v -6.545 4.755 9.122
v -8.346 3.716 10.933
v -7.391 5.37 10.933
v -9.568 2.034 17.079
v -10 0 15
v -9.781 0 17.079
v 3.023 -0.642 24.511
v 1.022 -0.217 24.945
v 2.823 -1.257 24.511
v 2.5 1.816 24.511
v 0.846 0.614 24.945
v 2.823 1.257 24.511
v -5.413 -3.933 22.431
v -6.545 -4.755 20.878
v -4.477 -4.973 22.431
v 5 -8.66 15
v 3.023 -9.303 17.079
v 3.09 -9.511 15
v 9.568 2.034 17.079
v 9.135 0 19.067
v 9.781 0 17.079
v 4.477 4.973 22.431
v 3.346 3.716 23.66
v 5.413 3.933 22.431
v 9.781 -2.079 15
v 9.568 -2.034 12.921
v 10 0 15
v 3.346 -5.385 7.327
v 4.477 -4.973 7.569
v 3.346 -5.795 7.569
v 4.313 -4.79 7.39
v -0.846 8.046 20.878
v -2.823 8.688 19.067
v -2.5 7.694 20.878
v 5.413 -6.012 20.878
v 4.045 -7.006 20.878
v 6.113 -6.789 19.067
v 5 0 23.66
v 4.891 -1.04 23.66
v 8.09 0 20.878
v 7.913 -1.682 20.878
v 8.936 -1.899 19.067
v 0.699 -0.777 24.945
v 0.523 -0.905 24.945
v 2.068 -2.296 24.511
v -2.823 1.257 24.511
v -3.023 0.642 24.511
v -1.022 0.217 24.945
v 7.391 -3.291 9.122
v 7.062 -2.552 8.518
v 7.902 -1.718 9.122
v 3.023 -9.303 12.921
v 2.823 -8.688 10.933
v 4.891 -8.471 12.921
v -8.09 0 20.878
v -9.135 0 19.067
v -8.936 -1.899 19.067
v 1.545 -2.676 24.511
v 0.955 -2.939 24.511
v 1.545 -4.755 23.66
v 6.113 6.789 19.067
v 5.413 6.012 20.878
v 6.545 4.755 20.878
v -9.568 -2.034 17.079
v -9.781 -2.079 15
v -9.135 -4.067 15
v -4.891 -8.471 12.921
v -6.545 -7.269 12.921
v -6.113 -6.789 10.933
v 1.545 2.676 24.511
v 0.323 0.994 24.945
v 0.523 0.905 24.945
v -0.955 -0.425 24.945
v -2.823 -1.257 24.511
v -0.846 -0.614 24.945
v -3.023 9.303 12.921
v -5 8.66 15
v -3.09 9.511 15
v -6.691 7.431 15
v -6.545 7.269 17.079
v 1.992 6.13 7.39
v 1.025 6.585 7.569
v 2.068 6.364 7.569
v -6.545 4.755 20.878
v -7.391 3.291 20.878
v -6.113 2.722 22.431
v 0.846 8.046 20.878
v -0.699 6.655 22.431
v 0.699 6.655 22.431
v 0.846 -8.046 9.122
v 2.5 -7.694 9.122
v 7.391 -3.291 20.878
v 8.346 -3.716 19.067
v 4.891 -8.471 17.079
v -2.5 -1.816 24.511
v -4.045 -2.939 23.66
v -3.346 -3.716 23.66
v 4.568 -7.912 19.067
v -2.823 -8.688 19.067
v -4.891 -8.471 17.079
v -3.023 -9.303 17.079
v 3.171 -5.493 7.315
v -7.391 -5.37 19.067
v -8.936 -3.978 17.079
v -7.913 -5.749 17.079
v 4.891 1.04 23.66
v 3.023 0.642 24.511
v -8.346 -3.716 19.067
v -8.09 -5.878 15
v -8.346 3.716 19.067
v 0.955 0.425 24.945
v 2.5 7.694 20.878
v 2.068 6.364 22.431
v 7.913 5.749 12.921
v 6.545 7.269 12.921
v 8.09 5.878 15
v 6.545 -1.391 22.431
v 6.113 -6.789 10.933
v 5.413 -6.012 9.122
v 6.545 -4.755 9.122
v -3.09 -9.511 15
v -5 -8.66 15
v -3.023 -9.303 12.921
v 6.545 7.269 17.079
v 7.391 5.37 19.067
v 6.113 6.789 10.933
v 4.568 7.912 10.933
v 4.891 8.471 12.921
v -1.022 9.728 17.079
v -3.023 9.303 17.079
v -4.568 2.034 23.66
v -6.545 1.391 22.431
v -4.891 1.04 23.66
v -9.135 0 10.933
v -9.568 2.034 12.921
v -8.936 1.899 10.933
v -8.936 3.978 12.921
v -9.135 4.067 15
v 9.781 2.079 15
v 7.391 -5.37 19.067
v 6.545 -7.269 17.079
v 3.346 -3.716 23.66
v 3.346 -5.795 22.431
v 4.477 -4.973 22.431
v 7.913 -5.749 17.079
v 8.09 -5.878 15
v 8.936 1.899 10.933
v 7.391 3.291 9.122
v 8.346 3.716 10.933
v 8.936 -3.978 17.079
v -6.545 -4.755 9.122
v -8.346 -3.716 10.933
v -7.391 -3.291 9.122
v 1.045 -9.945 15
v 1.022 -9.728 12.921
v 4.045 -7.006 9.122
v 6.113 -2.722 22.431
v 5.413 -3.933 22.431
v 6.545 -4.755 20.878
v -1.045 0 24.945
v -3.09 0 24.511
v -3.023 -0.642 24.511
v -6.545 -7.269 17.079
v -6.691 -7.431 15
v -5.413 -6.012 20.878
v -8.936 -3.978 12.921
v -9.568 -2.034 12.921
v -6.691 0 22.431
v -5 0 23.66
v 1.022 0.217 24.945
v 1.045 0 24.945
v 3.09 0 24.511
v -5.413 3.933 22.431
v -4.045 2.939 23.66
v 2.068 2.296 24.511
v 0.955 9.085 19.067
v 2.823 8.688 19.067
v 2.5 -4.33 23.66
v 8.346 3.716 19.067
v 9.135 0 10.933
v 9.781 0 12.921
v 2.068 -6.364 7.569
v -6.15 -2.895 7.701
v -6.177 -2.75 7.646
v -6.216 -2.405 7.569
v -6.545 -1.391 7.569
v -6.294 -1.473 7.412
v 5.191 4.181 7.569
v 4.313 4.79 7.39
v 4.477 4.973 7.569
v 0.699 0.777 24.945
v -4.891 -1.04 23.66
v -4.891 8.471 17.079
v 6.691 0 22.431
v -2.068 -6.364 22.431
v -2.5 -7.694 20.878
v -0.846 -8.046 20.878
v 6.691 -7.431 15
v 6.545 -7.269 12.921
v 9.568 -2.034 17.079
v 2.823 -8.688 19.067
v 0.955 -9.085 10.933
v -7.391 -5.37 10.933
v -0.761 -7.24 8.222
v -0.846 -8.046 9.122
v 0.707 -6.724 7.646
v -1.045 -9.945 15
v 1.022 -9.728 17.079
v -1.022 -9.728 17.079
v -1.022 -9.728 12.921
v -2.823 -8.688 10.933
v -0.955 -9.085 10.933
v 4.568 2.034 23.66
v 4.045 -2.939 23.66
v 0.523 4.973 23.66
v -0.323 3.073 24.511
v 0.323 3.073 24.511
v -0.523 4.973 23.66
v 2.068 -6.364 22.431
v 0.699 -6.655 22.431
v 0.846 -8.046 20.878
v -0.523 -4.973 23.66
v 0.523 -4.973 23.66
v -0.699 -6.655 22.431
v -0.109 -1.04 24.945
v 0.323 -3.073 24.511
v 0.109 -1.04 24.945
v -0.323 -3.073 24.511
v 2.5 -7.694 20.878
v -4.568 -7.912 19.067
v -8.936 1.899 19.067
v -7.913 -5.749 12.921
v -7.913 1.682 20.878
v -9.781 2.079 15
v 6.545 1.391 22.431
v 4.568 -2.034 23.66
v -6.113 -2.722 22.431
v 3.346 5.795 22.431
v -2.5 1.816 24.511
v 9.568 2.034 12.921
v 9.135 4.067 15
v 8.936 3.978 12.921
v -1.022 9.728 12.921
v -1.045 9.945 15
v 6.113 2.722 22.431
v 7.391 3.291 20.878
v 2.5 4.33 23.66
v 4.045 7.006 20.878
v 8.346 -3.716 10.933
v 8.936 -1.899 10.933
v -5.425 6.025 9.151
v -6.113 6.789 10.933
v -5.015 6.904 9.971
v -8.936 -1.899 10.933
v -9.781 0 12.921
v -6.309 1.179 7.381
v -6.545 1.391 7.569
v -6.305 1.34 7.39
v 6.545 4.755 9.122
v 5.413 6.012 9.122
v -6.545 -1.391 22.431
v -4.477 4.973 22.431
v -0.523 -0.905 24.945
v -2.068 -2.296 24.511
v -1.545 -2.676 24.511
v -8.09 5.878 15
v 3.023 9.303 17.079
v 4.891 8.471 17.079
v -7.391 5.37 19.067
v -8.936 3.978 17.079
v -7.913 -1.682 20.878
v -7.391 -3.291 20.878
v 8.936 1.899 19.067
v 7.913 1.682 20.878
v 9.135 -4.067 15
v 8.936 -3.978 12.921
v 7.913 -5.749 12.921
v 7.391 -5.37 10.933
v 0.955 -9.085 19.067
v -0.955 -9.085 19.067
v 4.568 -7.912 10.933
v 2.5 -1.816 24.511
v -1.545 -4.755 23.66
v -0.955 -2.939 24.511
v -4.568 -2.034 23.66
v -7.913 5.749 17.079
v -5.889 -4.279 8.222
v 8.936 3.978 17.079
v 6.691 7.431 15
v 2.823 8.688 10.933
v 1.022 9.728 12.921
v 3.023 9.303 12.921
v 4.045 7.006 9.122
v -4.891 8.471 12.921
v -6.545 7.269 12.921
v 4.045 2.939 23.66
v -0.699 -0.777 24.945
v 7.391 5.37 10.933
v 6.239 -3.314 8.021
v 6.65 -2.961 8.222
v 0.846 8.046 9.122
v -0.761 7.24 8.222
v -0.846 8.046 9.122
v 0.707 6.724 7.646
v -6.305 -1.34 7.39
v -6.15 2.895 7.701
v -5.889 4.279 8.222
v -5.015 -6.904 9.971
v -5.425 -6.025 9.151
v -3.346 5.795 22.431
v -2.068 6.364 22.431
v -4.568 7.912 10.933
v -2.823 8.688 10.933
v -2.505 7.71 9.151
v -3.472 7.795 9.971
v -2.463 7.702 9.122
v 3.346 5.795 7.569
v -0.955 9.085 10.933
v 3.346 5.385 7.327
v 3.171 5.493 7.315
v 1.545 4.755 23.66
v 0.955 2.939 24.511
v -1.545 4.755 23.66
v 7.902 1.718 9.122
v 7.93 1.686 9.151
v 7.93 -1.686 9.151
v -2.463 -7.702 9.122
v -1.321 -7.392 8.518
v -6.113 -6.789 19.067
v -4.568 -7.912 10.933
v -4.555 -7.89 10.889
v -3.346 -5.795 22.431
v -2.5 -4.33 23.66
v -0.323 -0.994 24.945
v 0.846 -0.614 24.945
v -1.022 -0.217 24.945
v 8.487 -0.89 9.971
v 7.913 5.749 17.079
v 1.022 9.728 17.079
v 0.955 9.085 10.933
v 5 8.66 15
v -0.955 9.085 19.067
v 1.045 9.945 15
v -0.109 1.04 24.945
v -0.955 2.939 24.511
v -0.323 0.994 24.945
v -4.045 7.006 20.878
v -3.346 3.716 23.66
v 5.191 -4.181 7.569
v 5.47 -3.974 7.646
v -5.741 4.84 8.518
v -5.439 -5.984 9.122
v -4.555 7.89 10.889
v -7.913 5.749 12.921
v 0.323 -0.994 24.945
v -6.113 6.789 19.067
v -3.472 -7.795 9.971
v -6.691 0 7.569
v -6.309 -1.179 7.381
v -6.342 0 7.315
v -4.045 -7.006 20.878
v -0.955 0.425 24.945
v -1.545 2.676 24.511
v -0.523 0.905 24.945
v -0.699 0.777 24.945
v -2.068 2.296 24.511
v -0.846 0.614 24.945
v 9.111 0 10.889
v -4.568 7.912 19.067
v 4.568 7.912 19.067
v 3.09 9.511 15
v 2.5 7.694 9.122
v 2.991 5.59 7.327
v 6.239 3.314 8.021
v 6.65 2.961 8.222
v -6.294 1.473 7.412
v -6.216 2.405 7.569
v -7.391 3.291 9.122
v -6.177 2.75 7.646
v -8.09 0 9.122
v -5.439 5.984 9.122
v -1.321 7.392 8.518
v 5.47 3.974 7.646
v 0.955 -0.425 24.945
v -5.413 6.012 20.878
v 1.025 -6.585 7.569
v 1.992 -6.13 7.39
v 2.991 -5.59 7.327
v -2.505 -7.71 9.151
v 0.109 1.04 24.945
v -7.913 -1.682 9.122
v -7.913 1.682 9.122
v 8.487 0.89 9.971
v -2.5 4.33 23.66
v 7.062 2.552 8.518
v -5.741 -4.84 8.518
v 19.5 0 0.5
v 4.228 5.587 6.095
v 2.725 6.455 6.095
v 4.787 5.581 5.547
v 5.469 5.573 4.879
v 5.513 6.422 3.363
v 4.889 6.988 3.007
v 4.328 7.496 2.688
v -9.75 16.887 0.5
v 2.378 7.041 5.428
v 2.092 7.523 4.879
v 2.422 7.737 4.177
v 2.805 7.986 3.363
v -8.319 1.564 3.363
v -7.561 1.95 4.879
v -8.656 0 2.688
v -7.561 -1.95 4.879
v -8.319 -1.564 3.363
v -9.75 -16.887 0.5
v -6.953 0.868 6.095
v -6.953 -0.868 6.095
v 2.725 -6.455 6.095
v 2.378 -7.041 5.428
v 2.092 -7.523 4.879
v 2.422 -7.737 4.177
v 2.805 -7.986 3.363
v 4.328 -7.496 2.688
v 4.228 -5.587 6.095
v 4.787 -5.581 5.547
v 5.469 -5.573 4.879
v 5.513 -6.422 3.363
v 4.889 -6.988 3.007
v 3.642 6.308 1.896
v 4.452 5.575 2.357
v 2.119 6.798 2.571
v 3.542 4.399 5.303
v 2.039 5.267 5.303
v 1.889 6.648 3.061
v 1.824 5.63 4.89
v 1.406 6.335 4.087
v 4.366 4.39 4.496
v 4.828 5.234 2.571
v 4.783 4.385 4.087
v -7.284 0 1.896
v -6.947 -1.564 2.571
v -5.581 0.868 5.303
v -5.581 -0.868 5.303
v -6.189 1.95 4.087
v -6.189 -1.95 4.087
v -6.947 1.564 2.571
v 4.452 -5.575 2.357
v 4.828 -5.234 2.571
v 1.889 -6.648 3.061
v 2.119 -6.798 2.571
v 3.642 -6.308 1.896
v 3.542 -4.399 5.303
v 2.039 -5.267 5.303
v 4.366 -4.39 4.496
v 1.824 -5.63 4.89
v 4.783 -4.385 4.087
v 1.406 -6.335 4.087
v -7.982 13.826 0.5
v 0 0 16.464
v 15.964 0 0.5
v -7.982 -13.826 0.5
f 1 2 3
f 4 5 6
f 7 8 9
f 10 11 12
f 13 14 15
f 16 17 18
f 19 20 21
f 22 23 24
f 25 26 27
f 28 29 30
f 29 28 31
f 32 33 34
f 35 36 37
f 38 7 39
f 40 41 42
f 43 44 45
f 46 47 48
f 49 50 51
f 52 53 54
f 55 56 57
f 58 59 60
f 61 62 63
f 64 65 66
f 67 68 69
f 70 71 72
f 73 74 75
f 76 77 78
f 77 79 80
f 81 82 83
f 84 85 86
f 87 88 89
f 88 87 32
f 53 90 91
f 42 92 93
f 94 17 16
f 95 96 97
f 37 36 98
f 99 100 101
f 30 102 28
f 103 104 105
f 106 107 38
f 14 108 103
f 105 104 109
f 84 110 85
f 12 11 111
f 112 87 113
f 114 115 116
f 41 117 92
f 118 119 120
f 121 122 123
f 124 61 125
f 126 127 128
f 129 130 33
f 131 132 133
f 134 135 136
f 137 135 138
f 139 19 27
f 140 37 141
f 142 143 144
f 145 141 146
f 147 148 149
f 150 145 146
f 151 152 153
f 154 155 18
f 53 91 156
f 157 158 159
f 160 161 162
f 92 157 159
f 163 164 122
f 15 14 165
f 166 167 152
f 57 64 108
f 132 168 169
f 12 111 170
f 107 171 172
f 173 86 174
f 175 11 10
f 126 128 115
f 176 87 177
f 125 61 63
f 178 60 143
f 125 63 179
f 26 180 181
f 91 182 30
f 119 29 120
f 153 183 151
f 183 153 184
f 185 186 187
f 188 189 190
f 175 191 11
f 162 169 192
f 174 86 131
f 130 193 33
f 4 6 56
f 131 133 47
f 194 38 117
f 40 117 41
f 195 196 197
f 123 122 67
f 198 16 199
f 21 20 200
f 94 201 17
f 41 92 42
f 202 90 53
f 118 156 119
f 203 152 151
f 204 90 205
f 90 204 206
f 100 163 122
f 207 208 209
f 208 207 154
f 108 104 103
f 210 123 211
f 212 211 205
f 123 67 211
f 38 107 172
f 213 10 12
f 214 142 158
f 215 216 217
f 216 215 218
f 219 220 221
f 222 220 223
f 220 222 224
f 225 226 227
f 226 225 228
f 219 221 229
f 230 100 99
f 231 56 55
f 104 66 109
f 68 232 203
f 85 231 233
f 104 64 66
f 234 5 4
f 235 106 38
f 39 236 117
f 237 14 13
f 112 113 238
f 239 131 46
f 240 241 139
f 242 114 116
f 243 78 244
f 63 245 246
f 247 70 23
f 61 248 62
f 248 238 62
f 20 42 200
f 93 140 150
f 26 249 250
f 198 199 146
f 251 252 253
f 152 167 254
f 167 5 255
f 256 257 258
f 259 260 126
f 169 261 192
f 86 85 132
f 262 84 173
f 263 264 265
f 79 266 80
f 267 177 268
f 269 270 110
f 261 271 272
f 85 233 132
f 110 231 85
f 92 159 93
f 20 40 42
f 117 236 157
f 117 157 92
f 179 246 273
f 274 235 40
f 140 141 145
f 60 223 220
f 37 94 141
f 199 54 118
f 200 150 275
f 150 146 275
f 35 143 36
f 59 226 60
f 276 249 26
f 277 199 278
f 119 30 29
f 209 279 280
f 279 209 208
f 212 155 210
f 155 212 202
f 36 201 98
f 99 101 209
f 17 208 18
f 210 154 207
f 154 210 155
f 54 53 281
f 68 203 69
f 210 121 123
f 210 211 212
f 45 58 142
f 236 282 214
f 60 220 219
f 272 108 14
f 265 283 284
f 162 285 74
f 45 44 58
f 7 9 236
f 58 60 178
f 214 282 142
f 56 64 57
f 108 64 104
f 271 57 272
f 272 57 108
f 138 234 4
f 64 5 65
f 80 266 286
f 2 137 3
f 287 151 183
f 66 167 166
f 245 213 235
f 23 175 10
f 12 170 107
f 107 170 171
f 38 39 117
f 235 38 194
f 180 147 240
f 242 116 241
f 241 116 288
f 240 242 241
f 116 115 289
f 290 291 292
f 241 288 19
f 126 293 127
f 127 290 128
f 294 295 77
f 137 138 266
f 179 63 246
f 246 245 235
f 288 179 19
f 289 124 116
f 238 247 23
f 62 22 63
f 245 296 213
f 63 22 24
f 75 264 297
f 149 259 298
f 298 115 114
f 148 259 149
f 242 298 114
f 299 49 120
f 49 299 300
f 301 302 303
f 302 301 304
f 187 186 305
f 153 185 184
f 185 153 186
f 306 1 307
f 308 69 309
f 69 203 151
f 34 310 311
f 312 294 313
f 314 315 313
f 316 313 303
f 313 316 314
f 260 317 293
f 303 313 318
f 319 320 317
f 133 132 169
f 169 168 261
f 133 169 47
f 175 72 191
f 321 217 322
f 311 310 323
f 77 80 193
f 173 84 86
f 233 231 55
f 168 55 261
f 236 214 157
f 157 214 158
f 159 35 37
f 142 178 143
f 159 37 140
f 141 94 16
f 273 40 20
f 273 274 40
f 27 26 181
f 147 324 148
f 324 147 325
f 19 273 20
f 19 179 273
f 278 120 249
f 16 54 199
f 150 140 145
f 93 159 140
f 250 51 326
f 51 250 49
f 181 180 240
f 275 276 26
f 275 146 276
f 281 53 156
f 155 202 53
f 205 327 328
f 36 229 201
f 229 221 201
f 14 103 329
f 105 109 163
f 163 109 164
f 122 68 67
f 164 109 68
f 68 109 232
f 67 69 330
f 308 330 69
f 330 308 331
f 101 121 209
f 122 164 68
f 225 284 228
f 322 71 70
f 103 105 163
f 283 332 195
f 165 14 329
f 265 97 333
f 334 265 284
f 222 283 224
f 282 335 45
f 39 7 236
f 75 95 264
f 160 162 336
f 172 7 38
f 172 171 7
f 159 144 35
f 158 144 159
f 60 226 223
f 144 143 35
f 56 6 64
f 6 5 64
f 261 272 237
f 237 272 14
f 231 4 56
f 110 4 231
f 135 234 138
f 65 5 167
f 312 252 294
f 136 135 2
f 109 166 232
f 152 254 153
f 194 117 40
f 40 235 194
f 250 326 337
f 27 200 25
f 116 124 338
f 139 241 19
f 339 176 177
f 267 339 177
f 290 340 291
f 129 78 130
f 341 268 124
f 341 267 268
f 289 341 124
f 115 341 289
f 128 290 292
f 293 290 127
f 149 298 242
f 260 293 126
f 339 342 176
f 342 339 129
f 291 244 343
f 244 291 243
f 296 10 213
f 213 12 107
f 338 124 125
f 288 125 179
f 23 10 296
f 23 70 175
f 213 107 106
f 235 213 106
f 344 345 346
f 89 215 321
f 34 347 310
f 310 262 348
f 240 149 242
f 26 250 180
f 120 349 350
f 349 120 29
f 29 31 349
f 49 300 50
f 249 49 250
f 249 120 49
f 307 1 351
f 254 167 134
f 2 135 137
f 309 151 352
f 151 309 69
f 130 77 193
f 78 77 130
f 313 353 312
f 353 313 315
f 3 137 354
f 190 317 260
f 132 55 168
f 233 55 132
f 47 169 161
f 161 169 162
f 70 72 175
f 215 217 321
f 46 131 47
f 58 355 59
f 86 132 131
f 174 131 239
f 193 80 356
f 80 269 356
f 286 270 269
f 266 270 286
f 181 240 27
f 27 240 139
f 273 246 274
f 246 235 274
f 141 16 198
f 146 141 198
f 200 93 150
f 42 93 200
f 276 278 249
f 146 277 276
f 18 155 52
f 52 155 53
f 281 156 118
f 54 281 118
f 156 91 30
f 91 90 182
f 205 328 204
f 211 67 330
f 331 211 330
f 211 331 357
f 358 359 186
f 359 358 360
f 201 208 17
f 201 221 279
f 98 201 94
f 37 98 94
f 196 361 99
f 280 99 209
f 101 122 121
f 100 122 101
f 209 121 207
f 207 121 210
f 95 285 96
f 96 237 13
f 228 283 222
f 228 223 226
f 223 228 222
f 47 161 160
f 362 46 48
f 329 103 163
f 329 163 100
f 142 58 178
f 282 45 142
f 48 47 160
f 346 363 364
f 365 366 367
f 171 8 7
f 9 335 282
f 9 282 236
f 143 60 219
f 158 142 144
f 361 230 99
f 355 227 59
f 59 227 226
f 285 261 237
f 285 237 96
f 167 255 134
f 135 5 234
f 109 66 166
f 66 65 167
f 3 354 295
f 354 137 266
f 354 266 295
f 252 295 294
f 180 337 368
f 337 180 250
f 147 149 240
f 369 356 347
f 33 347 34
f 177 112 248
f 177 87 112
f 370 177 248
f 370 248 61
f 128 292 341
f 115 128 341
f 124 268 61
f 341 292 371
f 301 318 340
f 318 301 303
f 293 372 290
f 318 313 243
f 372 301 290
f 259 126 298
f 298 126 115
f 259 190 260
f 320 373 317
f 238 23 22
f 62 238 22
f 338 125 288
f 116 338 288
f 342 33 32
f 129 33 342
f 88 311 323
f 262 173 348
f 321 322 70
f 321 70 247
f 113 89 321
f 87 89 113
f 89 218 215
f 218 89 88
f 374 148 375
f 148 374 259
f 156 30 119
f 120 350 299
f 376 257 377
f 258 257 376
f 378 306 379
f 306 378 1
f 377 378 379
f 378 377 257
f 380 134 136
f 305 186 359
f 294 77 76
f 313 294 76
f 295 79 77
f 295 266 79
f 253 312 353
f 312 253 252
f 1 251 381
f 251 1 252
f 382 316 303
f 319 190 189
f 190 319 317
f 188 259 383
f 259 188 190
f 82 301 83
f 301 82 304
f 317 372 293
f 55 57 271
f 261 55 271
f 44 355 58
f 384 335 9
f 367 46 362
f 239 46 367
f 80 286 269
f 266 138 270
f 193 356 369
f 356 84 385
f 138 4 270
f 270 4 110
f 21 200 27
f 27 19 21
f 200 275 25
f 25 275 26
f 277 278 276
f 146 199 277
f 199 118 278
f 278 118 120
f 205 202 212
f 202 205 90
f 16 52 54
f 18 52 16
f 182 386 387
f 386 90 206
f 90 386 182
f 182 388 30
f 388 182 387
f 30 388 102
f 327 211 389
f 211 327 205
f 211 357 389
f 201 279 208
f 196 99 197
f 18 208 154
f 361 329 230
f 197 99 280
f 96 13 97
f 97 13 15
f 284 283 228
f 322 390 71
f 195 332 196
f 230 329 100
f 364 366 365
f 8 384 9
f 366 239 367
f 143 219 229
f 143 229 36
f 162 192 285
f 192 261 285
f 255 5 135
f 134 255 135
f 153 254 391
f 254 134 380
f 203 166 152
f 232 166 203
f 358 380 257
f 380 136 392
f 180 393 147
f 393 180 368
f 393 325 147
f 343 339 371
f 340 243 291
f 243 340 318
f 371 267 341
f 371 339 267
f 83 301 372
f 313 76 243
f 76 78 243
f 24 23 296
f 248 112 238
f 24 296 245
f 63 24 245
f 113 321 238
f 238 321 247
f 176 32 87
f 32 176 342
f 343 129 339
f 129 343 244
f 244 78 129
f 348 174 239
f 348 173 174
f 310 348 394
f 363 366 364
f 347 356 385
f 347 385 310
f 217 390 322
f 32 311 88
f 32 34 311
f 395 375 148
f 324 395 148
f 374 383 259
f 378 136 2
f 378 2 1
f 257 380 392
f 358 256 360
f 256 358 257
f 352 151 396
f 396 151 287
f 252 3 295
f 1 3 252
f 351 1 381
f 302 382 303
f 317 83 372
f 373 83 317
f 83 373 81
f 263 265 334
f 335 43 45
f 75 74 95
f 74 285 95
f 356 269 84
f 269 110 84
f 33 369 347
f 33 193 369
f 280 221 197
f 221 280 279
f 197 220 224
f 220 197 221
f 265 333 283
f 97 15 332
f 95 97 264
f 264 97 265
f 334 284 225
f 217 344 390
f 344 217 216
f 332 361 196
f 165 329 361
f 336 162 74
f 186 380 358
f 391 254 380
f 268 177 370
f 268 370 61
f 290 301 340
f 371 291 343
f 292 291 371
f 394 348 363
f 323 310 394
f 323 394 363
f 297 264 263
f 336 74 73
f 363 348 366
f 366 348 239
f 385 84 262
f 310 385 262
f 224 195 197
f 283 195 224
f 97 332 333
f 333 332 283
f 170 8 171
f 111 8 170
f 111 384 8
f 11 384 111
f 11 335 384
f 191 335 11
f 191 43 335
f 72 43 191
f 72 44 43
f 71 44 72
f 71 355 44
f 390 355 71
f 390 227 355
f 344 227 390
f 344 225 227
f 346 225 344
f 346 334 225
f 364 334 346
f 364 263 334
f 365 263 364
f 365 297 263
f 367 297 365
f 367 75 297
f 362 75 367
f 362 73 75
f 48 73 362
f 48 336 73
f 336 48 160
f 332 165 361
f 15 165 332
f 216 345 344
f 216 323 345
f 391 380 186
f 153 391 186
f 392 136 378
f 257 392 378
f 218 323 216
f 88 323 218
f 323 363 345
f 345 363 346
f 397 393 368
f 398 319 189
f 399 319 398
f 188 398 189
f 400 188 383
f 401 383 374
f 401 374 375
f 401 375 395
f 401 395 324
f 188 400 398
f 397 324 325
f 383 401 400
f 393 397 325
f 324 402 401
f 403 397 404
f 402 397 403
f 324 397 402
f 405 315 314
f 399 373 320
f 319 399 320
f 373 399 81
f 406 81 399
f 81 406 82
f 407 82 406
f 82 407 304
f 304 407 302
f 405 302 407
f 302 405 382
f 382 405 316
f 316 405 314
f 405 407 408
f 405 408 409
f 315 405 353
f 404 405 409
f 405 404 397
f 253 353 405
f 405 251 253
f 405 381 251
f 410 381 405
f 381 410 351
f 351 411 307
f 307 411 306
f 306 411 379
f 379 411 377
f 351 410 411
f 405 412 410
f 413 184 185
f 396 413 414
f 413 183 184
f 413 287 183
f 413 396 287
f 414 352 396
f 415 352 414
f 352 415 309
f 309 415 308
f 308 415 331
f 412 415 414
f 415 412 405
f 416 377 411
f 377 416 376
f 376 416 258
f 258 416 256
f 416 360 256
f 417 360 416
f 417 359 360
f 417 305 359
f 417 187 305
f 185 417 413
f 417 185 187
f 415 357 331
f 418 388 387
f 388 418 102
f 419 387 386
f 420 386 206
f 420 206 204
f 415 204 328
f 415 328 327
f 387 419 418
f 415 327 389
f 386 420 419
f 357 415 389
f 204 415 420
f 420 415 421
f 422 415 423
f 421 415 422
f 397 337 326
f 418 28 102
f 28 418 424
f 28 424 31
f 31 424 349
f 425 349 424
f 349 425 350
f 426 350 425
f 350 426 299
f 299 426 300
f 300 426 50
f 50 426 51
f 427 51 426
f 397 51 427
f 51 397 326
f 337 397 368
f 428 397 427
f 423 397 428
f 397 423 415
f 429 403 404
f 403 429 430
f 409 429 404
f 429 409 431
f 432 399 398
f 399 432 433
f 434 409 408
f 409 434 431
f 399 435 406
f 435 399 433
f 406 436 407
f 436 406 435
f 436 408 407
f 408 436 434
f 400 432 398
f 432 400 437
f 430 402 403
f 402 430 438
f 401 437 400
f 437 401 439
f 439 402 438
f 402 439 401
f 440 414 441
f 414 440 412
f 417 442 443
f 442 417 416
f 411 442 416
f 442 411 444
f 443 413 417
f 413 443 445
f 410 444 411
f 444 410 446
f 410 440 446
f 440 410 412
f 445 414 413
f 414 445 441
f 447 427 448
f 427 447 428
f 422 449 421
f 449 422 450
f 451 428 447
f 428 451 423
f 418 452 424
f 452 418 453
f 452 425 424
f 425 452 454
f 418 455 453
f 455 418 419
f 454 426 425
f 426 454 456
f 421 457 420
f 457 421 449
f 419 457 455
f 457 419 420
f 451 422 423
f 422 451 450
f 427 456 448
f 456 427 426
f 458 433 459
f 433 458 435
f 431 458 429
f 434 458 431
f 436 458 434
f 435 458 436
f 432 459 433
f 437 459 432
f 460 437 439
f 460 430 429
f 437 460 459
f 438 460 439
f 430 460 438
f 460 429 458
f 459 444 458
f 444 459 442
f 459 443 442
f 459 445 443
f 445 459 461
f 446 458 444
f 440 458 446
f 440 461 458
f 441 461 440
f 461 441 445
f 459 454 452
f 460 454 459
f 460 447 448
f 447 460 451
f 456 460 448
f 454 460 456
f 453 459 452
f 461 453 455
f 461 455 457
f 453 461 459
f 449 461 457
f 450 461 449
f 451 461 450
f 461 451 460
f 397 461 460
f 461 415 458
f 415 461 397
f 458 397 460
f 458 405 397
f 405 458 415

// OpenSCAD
r = 10;
r2 = 2 * r;

d = 2.5;
s = 4;

difference()
{
	union()
	{
		translate( [ 0, 0, r2*3/4 ] )
			sphere( r = r, center = true );
		translate( [ 0, 0, r2/2 ] )
			cylinder( r1 = r2, r2 = 0, h = r2, center = true, $fn = 3 );
	}

	translate( [ 0, 0, r2/2-d*sqrt(2) ] )
		cylinder( r1 = r2, r2 = 0, h = r2, center = true, $fn = 3 );

	cube( [ r*4, r*4, 1 ], center = true );

	for ( a = [ 0, 120, 240 ] ) rotate( a+60, [ 0, 0, 1 ] )
		translate( [ r2*cos(60), 0, 0 ] )
			rotate( [ 0, 60, 0 ] )
				translate( [ -1.25*s, 0, 0 ] )
			cylinder( r = s/2, h = d*3, center = true );
}
